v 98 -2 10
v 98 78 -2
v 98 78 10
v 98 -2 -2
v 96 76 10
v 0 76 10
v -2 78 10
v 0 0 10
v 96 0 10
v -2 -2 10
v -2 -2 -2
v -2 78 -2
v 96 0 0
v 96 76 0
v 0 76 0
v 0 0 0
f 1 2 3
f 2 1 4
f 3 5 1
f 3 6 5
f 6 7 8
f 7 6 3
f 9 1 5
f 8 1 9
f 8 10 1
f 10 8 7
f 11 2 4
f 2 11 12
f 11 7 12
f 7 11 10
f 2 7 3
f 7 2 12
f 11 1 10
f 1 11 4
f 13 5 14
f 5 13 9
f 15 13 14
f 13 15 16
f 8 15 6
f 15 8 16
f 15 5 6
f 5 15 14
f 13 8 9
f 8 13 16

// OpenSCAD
BORDER = 2;
IN_X = 96;
IN_Y = 76;
IN_Z = 10;

difference() {
    translate([-BORDER, -BORDER, -BORDER])
        cube([IN_X + BORDER*2, IN_Y + BORDER*2, IN_Z + BORDER]);
    cube([IN_X, IN_Y, 50]);
}

module spring(r1 = 100, r2 = 10, h = 100, hr = 12)
{
	stepsize = 1/16;
	module segment(i1, i2) {
		alpha1 = i1 * 360*r2/hr;
		alpha2 = i2 * 360*r2/hr;
		len1 = sin(acos(i1*2-1))*r2;
		len2 = sin(acos(i2*2-1))*r2;
		if (len1 < 0.01)
			polygon([
				[ cos(alpha1)*r1, sin(alpha1)*r1 ],
				[ cos(alpha2)*(r1-len2), sin(alpha2)*(r1-len2) ],
				[ cos(alpha2)*(r1+len2), sin(alpha2)*(r1+len2) ]
			]);
		if (len2 < 0.01)
			polygon([
				[ cos(alpha1)*(r1+len1), sin(alpha1)*(r1+len1) ],
				[ cos(alpha1)*(r1-len1), sin(alpha1)*(r1-len1) ],
				[ cos(alpha2)*r1, sin(alpha2)*r1 ],
			]);
		if (len1 >= 0.01 && len2 >= 0.01)
			polygon([
				[ cos(alpha1)*(r1+len1), sin(alpha1)*(r1+len1) ],
				[ cos(alpha1)*(r1-len1), sin(alpha1)*(r1-len1) ],
				[ cos(alpha2)*(r1-len2), sin(alpha2)*(r1-len2) ],
				[ cos(alpha2)*(r1+len2), sin(alpha2)*(r1+len2) ]
			]);
	}
	linear_extrude(height = 100, twist = 180*h/hr,
			$fn = (hr/r2)/stepsize, convexity = 5) {
		for (i = [ stepsize : stepsize : 1+stepsize/2 ])
			segment(i-stepsize, min(i, 1));
	}
}

spring(2, 1, 10, 1);
